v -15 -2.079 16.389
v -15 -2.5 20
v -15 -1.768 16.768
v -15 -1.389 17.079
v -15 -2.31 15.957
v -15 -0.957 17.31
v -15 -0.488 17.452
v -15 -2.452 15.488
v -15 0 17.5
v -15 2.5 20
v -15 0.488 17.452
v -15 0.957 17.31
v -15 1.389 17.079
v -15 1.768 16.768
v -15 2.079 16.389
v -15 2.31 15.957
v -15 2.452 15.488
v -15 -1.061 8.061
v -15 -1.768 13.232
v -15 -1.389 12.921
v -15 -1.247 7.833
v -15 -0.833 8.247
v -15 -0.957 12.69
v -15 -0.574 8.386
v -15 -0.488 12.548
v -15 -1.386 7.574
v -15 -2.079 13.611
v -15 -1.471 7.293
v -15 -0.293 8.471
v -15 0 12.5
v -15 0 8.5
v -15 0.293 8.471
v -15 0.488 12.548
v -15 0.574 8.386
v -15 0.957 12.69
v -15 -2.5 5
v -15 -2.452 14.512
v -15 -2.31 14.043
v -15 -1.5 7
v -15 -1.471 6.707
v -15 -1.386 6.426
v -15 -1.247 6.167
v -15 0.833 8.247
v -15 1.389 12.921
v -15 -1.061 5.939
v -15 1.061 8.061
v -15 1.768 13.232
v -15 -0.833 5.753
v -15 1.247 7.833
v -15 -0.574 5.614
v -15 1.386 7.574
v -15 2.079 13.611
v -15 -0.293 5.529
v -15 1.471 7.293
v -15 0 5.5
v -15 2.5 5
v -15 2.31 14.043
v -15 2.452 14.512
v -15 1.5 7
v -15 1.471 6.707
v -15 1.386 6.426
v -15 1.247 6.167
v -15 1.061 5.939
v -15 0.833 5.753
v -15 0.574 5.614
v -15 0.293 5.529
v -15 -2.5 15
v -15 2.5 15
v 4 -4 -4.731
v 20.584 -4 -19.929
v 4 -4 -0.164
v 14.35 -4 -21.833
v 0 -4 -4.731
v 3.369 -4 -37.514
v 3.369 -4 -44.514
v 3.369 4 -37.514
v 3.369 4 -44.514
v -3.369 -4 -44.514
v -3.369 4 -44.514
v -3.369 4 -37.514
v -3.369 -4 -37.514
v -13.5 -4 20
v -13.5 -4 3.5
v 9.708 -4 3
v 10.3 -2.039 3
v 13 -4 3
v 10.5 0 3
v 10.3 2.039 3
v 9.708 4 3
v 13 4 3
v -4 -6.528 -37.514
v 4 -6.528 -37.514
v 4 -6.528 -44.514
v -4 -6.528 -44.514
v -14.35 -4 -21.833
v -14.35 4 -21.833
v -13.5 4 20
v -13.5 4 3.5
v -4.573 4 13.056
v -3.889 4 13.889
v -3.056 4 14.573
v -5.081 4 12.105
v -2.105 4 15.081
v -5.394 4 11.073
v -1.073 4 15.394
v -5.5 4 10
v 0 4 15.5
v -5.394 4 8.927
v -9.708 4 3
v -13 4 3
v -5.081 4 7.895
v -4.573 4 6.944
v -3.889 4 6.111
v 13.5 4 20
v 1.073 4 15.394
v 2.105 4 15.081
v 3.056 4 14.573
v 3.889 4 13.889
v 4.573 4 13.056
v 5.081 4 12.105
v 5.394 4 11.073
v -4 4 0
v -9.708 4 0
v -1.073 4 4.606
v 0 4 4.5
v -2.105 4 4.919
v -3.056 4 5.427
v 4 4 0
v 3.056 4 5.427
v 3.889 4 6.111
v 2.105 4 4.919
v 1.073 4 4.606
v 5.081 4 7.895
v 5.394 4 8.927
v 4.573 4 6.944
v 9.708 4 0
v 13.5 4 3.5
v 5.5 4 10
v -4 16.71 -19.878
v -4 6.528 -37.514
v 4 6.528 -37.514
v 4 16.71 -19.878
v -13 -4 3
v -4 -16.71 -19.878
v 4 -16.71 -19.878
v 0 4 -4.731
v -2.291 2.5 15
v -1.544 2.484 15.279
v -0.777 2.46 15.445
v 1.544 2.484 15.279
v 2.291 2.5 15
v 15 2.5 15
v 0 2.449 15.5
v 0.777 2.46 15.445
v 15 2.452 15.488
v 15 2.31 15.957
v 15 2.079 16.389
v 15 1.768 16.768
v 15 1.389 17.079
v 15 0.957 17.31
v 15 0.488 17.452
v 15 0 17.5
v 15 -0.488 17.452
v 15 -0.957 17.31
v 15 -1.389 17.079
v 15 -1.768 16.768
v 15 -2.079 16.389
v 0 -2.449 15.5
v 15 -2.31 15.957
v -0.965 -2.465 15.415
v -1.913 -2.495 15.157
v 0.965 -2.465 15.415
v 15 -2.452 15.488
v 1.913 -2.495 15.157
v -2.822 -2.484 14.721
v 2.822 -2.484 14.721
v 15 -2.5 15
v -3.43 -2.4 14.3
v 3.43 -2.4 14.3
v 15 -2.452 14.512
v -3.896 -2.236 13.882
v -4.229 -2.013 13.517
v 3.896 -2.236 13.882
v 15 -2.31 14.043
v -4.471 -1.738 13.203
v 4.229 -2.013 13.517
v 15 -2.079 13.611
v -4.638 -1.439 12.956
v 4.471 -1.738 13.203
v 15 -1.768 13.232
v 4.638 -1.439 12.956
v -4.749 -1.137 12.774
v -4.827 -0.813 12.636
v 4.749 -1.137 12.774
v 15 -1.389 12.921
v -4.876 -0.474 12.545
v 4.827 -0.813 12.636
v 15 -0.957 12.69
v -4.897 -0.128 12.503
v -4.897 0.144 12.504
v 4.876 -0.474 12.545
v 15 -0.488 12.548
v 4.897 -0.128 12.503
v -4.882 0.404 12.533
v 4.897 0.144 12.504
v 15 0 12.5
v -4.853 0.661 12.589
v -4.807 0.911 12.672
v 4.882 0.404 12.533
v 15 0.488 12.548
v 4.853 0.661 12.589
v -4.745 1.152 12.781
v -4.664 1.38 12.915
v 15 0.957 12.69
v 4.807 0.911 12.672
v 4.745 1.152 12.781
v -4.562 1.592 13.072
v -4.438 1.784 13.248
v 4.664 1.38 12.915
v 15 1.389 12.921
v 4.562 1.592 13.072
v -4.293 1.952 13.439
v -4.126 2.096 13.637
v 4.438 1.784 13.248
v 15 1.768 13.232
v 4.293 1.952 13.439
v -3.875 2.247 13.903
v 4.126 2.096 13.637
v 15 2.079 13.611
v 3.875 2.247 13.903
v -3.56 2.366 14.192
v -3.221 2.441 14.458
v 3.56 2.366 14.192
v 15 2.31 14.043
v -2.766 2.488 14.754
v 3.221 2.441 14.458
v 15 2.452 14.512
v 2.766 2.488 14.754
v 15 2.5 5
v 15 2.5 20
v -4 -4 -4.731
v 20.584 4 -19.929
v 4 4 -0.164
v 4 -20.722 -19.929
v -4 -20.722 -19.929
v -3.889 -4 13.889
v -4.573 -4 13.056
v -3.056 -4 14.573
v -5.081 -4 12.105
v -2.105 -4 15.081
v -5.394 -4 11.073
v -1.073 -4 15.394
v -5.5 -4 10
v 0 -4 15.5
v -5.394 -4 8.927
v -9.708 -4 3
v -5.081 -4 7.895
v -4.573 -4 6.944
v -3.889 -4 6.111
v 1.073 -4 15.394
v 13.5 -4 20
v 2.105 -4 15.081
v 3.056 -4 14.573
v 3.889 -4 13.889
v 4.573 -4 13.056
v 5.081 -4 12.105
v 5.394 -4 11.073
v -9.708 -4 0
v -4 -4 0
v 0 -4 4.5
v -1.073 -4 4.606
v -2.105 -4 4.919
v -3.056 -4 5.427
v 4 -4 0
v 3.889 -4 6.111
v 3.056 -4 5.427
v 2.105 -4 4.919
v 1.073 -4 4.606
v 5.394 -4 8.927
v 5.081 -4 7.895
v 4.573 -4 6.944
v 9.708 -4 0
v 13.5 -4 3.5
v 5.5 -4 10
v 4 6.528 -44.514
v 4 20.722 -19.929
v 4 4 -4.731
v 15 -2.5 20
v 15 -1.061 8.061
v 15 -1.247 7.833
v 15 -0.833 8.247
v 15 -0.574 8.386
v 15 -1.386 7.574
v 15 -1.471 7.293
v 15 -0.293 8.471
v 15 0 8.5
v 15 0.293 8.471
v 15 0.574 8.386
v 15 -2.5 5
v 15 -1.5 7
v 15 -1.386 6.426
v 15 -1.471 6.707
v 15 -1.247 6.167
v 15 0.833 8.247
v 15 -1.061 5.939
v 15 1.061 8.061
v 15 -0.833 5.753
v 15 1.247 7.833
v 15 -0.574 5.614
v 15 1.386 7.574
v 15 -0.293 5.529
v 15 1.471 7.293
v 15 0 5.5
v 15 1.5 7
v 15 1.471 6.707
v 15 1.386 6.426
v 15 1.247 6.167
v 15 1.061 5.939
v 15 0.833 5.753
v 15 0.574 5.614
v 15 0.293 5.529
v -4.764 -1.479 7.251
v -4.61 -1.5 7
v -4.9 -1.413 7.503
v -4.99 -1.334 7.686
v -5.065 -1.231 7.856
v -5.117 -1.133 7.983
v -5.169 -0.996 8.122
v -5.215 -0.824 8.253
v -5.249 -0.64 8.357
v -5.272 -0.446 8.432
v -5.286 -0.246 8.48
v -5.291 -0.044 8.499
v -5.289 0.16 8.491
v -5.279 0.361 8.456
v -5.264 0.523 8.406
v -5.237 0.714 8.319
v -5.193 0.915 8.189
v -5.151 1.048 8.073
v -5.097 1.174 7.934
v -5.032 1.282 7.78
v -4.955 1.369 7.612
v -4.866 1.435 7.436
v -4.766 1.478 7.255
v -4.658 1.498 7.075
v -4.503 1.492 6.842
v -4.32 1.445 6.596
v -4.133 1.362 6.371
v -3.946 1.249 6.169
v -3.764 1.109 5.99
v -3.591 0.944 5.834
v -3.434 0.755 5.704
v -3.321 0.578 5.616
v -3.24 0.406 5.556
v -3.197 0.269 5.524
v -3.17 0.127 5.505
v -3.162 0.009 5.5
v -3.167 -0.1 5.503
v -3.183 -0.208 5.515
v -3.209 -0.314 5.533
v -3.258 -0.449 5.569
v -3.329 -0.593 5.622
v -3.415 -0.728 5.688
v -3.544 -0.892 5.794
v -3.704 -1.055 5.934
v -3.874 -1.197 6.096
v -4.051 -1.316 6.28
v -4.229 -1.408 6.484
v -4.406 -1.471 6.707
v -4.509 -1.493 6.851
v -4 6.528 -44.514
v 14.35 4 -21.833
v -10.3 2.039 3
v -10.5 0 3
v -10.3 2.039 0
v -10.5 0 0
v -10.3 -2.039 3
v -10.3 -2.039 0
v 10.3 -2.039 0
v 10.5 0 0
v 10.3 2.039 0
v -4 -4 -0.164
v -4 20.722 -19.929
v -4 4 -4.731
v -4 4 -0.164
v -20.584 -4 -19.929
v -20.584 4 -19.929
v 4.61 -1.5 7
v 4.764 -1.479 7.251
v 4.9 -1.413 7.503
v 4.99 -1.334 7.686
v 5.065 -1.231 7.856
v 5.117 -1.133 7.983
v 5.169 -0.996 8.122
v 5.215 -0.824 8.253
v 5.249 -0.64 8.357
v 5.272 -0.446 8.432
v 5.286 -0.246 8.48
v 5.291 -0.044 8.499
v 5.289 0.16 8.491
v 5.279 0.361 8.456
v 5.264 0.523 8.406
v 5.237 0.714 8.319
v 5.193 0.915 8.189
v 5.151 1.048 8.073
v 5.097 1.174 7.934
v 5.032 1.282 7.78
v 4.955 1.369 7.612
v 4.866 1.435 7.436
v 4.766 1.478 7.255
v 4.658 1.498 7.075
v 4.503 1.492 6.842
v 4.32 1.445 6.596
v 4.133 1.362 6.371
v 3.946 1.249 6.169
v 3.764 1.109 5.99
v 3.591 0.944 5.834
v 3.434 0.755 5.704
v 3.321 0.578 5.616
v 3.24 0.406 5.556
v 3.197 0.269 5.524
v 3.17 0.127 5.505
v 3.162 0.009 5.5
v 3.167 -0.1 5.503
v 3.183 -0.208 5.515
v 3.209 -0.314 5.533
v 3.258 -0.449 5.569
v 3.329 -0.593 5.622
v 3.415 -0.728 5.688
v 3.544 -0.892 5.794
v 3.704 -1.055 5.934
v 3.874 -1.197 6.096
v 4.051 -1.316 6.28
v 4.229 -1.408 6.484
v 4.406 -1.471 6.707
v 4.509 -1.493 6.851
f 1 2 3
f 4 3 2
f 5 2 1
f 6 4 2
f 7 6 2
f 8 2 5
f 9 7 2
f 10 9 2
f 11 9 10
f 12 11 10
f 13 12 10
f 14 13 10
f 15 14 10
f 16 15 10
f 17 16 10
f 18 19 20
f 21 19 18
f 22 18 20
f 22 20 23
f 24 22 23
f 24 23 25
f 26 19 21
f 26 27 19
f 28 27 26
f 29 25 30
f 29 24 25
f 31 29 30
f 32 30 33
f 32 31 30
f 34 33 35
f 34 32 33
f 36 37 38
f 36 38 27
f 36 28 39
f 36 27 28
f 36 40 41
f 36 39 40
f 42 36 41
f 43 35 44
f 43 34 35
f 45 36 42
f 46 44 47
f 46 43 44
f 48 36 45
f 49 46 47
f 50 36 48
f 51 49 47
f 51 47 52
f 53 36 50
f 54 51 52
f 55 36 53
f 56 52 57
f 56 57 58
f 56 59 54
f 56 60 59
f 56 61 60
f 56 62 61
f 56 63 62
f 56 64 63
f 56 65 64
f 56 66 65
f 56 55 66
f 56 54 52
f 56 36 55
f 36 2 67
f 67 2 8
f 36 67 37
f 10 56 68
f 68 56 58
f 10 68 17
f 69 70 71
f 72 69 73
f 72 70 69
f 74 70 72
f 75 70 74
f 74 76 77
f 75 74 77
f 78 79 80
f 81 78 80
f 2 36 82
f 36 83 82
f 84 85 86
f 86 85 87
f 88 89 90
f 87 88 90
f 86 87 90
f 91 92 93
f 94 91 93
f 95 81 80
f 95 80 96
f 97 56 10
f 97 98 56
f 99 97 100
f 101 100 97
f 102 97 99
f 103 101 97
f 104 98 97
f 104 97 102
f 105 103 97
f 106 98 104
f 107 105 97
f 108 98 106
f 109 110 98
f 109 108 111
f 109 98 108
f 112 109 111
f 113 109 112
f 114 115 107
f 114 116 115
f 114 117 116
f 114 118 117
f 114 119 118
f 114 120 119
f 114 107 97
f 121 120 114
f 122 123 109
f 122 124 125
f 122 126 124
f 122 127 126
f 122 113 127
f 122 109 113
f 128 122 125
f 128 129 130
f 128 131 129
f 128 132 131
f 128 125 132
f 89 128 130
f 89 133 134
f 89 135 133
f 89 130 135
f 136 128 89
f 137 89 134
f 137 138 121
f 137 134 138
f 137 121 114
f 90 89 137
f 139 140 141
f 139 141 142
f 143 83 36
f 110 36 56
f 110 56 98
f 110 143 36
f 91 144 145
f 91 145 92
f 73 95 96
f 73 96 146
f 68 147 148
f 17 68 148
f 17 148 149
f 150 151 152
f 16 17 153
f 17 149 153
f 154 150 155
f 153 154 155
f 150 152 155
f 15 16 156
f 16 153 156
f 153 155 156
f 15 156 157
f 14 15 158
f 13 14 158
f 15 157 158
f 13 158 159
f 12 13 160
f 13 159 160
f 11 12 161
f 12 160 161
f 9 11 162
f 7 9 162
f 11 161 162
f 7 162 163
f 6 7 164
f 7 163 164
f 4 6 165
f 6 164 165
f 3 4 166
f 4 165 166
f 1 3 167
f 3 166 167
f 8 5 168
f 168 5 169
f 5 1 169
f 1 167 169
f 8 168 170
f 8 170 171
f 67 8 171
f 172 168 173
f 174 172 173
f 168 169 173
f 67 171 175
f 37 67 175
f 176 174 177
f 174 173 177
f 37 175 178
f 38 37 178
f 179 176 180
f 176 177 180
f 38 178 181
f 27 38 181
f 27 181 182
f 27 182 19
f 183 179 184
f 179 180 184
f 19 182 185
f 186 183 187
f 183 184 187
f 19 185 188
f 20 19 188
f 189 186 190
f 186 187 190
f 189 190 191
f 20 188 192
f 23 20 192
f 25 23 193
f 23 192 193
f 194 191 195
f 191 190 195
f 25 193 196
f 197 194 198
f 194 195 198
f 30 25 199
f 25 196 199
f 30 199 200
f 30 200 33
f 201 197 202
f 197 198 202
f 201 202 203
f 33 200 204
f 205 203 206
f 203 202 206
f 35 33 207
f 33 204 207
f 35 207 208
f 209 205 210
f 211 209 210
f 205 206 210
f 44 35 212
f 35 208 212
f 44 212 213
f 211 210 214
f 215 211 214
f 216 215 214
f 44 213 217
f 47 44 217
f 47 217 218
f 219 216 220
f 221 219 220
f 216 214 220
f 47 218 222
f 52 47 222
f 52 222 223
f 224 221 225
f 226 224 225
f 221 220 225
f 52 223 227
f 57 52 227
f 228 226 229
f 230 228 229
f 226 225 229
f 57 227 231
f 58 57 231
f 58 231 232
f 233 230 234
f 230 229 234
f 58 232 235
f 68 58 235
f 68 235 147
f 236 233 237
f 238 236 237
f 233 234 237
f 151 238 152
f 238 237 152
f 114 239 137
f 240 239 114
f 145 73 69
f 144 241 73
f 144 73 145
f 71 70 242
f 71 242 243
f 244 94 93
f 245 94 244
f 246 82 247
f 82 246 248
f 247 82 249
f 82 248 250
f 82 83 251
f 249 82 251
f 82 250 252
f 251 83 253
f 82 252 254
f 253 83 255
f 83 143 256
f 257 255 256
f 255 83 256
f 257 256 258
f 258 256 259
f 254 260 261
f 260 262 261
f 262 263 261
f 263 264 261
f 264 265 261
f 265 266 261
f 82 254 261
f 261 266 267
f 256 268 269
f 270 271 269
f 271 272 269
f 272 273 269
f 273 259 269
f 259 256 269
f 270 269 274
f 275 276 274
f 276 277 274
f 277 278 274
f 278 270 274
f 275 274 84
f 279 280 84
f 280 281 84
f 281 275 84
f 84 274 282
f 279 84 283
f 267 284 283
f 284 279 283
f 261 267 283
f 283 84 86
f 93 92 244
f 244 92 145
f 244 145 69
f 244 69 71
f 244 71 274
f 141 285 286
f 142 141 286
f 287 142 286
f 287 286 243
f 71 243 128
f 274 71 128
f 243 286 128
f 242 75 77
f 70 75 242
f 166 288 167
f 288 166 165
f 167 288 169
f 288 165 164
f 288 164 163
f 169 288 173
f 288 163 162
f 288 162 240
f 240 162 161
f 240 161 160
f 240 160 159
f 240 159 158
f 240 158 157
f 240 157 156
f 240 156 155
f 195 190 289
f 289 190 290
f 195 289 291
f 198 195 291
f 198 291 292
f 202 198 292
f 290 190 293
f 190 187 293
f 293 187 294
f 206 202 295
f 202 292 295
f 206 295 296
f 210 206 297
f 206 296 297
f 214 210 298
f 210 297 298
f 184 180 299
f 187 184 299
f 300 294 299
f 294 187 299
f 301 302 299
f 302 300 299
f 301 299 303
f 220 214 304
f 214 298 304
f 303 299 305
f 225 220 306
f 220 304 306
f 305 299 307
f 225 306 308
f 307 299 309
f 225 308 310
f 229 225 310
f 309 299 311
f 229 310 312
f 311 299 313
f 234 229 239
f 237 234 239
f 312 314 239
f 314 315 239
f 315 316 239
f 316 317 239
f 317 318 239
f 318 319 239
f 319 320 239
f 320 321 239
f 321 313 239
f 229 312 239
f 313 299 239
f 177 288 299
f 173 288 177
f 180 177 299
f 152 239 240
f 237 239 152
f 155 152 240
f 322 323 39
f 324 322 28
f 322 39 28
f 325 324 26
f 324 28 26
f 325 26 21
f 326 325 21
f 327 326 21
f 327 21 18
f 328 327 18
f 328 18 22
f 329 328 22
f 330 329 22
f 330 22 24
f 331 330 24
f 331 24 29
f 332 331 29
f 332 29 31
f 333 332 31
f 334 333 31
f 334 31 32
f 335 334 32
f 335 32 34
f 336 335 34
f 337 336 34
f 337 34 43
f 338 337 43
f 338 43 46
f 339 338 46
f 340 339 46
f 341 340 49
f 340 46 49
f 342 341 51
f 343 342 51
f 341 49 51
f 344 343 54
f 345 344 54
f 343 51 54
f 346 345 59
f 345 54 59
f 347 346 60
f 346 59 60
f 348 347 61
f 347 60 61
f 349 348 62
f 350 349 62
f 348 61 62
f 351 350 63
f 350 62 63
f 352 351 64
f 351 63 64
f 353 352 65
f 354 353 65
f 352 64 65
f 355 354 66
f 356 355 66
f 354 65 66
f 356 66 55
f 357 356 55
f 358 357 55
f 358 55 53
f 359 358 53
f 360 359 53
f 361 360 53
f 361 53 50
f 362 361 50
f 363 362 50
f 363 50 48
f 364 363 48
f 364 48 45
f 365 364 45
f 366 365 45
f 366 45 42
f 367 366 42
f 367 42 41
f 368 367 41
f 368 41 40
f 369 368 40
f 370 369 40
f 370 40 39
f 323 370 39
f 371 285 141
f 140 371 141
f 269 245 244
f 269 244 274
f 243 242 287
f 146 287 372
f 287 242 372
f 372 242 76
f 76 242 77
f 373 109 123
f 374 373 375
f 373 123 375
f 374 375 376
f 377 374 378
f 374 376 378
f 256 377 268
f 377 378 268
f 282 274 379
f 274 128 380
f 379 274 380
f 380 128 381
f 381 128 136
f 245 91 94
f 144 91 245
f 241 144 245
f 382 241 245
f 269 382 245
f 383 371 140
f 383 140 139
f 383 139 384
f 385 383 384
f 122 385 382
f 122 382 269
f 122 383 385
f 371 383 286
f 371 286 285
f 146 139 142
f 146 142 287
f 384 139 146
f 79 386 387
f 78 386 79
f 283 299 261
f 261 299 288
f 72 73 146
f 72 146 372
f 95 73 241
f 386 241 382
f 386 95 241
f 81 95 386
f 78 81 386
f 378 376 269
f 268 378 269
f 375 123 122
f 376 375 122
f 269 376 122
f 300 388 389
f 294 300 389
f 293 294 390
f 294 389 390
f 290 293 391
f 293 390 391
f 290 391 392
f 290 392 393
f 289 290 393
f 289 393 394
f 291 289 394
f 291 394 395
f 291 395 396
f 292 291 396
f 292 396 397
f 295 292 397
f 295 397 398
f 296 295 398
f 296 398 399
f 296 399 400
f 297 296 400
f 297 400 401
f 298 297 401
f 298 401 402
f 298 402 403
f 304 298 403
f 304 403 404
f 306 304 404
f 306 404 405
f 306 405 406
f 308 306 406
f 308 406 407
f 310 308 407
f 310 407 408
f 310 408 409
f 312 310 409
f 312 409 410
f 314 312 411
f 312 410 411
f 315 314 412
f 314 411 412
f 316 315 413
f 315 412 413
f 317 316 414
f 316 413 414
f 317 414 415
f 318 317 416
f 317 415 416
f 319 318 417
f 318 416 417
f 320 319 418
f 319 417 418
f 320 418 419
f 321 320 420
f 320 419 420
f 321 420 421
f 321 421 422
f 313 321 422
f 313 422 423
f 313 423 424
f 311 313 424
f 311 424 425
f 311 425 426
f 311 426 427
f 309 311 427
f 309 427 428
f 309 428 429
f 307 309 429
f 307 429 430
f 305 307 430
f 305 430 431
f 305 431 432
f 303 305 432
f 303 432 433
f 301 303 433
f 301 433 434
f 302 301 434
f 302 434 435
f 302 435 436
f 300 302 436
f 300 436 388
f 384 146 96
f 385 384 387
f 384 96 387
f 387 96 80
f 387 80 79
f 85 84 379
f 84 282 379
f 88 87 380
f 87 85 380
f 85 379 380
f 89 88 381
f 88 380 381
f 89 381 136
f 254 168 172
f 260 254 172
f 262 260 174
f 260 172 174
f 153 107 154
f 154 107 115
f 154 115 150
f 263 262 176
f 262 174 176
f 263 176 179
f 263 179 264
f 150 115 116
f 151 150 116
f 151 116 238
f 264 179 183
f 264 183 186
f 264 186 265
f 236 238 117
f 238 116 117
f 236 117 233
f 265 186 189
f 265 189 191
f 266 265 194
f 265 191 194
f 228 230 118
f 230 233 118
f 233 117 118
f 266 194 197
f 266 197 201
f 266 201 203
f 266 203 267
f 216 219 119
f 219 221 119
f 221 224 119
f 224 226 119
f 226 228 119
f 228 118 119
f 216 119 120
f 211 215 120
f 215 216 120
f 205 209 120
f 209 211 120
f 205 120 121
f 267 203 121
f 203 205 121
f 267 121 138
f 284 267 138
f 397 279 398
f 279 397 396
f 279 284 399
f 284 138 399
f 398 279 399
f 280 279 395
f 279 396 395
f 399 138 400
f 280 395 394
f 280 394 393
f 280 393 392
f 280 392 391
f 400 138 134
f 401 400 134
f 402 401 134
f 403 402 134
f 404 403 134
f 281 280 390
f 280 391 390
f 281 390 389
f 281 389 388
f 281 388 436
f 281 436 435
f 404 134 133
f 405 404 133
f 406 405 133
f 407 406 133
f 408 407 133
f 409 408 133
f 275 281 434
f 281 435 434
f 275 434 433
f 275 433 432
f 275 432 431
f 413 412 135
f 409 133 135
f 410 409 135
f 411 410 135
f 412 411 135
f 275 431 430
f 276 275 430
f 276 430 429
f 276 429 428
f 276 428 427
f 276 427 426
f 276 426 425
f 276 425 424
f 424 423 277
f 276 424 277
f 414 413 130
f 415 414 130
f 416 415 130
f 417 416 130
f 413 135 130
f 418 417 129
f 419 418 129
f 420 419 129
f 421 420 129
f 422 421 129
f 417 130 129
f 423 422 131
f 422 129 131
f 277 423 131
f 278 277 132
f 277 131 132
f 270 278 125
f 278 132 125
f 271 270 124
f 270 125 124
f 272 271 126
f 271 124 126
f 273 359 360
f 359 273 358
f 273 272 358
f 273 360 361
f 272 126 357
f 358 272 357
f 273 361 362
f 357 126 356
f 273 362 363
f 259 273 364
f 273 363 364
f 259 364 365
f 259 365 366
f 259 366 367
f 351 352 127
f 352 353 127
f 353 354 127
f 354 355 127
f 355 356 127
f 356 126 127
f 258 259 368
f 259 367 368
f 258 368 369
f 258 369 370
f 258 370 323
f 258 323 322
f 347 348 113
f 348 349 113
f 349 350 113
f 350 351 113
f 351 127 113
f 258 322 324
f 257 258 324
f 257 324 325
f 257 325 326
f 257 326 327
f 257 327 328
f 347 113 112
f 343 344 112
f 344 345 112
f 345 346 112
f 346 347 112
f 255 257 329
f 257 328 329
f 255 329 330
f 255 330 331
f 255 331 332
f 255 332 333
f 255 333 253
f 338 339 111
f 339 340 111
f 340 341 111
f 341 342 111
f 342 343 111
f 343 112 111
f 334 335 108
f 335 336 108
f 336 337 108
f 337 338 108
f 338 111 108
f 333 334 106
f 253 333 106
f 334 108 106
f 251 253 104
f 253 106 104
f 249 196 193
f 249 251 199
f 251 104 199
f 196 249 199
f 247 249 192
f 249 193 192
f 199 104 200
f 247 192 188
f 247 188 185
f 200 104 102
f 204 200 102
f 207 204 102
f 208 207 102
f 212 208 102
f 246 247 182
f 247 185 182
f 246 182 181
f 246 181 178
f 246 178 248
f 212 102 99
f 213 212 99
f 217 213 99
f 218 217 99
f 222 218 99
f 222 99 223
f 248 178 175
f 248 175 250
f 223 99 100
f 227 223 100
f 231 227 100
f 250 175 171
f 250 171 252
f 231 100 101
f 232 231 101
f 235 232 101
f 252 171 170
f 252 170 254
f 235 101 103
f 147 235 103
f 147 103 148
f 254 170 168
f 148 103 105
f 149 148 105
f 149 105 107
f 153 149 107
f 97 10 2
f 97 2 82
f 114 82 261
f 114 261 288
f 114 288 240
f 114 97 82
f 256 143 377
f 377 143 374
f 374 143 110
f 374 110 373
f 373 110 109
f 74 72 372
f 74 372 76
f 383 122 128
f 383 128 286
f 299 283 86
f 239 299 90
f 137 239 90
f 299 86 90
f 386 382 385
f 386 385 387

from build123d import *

# Parameters (mm, degrees)
IZIM2_R                          = 10.5
Y_KSEKLIK_EKSTR_ZYON1_DEPTH      = 3
Y_KSEKLIK_EKSTR_ZYON3_DEPTH      = 4
Y_KSEKLIK_EKSTR_ZYON3_DEPTH_BACK = 4
Y_KSEKLIK_EKSTR_ZYON6_DEPTH      = 4
Y_KSEKLIK_EKSTR_ZYON6_DEPTH_BACK = 4
IZIM5_W                          = 23.418755165
IZIM5_H                          = 7.378370442
IZIM5_H_2                        = 8.702399003
KES_EKSTR_ZYON1_DEPTH            = 3
IZIM6_W                          = 30
IZIM6_H                          = 8
Y_KSEKLIK_EKSTR_ZYON7_DEPTH      = 17
IZIM7_R                          = 2.5
KES_EKSTR_ZYON2_DEPTH            = 30
IZIM8_R                          = 1.5
KES_EKSTR_ZYON3_DEPTH            = 30
PAH1_SIZE                        = 1.5
PAH2_SIZE                        = 2
IZIM9_R                          = 5.5
KES_EKSTR_ZYON4_DEPTH            = 17


with BuildPart() as part:
    # Çizim2 → Yükseklik-Ekstrüzyon1 (new body)
    with BuildSketch(Plane.XY):
        Circle(IZIM2_R)
    extrude(amount=Y_KSEKLIK_EKSTR_ZYON1_DEPTH)

    # Çizim3 → Yükseklik-Ekstrüzyon3 (add, two sides: drawn at the far end of the back side and taken through both)
    with BuildSketch(Plane(origin=(0, 0, 0), x_dir=(1, 0, 0), z_dir=(0, 1, 0)).offset(-Y_KSEKLIK_EKSTR_ZYON3_DEPTH_BACK)):
        Polygon((-14.349740813, 21.832604096), (0, 4.731248928), (14.349740813, 21.832604096), (3.3694522, 37.514081392), (3.3694522, 44.514081392), (20.58445702, 19.928506573), (3.862454505, 0), (-3.862454505, 0), (-20.58445702, 19.928506573), (-3.3694522, 44.514081392), (-3.3694522, 37.514081392), align=None)
    extrude(amount=Y_KSEKLIK_EKSTR_ZYON3_DEPTH + Y_KSEKLIK_EKSTR_ZYON3_DEPTH_BACK)

    # Çizim4 → Yükseklik-Ekstrüzyon6 (add, two sides: drawn at the far end of the back side and taken through both)
    with BuildSketch(Plane(origin=(0, 0, 0), x_dir=(0, 0, -1), z_dir=(1, 0, 0)).offset(-Y_KSEKLIK_EKSTR_ZYON6_DEPTH_BACK)):
        Polygon((44.514081392, 6.527514275), (37.514081392, 6.527514275), (19.878054627, 16.709679075), (4.731248928, 4), (4.731248928, -4), (19.878054627, -16.709679075), (37.514081392, -6.527514275), (44.514081392, -6.527514275), (19.928506573, -20.722002515), (0, -4), (0, 4), (19.928506573, 20.722002515), align=None)
    extrude(amount=Y_KSEKLIK_EKSTR_ZYON6_DEPTH + Y_KSEKLIK_EKSTR_ZYON6_DEPTH_BACK)

    # Çizim5 → Kes-Ekstrüzyon1 (cut)
    with BuildSketch(Plane.XY.offset(3)):
        with Locations((0.537886602, 7.689185221)):
            Rectangle(IZIM5_W, IZIM5_H)
        with Locations((0.537886602, -8.351199502)):
            Rectangle(IZIM5_W, IZIM5_H_2)
    extrude(amount=-KES_EKSTR_ZYON1_DEPTH, mode=Mode.SUBTRACT)

    # Çizim6 → Yükseklik-Ekstrüzyon7 (add)
    with BuildSketch(Plane.XY.offset(3)):
        Rectangle(IZIM6_W, IZIM6_H)
    extrude(amount=Y_KSEKLIK_EKSTR_ZYON7_DEPTH)

    # Çizim7 → Kes-Ekstrüzyon2 (cut)
    with BuildSketch(Plane(origin=(15, 0, 0), x_dir=(0, 0, -1), z_dir=(1, 0, 0))):
        with Locations(Location((-15, 0, 0), (0, 0, 90))):
            Circle(IZIM7_R)
    extrude(amount=-KES_EKSTR_ZYON2_DEPTH, mode=Mode.SUBTRACT)

    # Çizim8 → Kes-Ekstrüzyon3 (cut)
    with BuildSketch(Plane.ZY.offset(15)):
        with Locations(Location((7, 0, 0), (0, 0, 270))):
            Circle(IZIM8_R)
    extrude(amount=-KES_EKSTR_ZYON3_DEPTH, mode=Mode.SUBTRACT)

    # Pah1
    pah1_edges = [part.edges().sort_by_distance(p)[0] for p in [
        (15, -4, 11.5),
        (15, 4, 11.5),
        (-15, -4, 11.5),
        (-15, 4, 11.5),
    ]]
    chamfer(pah1_edges, length=PAH1_SIZE - 0.0001)  # a hair under: the kernel refuses the full size

    # Pah2
    pah2_edges = [part.edges().sort_by_distance(p)[0] for p in [
        (15, 0, 3),
        (-15, 0, 3),
    ]]
    chamfer(pah2_edges, length=PAH2_SIZE)

    # Çizim9 → Kes-Ekstrüzyon4 (cut)
    with BuildSketch(Plane(origin=(0, 4, 0), x_dir=(1, 0, 0), z_dir=(0, 1, 0))):
        with Locations(Location((0, -10, 0), (0, 0, 270))):
            Circle(IZIM9_R)
    extrude(amount=-KES_EKSTR_ZYON4_DEPTH, mode=Mode.SUBTRACT)


solid = part.part
